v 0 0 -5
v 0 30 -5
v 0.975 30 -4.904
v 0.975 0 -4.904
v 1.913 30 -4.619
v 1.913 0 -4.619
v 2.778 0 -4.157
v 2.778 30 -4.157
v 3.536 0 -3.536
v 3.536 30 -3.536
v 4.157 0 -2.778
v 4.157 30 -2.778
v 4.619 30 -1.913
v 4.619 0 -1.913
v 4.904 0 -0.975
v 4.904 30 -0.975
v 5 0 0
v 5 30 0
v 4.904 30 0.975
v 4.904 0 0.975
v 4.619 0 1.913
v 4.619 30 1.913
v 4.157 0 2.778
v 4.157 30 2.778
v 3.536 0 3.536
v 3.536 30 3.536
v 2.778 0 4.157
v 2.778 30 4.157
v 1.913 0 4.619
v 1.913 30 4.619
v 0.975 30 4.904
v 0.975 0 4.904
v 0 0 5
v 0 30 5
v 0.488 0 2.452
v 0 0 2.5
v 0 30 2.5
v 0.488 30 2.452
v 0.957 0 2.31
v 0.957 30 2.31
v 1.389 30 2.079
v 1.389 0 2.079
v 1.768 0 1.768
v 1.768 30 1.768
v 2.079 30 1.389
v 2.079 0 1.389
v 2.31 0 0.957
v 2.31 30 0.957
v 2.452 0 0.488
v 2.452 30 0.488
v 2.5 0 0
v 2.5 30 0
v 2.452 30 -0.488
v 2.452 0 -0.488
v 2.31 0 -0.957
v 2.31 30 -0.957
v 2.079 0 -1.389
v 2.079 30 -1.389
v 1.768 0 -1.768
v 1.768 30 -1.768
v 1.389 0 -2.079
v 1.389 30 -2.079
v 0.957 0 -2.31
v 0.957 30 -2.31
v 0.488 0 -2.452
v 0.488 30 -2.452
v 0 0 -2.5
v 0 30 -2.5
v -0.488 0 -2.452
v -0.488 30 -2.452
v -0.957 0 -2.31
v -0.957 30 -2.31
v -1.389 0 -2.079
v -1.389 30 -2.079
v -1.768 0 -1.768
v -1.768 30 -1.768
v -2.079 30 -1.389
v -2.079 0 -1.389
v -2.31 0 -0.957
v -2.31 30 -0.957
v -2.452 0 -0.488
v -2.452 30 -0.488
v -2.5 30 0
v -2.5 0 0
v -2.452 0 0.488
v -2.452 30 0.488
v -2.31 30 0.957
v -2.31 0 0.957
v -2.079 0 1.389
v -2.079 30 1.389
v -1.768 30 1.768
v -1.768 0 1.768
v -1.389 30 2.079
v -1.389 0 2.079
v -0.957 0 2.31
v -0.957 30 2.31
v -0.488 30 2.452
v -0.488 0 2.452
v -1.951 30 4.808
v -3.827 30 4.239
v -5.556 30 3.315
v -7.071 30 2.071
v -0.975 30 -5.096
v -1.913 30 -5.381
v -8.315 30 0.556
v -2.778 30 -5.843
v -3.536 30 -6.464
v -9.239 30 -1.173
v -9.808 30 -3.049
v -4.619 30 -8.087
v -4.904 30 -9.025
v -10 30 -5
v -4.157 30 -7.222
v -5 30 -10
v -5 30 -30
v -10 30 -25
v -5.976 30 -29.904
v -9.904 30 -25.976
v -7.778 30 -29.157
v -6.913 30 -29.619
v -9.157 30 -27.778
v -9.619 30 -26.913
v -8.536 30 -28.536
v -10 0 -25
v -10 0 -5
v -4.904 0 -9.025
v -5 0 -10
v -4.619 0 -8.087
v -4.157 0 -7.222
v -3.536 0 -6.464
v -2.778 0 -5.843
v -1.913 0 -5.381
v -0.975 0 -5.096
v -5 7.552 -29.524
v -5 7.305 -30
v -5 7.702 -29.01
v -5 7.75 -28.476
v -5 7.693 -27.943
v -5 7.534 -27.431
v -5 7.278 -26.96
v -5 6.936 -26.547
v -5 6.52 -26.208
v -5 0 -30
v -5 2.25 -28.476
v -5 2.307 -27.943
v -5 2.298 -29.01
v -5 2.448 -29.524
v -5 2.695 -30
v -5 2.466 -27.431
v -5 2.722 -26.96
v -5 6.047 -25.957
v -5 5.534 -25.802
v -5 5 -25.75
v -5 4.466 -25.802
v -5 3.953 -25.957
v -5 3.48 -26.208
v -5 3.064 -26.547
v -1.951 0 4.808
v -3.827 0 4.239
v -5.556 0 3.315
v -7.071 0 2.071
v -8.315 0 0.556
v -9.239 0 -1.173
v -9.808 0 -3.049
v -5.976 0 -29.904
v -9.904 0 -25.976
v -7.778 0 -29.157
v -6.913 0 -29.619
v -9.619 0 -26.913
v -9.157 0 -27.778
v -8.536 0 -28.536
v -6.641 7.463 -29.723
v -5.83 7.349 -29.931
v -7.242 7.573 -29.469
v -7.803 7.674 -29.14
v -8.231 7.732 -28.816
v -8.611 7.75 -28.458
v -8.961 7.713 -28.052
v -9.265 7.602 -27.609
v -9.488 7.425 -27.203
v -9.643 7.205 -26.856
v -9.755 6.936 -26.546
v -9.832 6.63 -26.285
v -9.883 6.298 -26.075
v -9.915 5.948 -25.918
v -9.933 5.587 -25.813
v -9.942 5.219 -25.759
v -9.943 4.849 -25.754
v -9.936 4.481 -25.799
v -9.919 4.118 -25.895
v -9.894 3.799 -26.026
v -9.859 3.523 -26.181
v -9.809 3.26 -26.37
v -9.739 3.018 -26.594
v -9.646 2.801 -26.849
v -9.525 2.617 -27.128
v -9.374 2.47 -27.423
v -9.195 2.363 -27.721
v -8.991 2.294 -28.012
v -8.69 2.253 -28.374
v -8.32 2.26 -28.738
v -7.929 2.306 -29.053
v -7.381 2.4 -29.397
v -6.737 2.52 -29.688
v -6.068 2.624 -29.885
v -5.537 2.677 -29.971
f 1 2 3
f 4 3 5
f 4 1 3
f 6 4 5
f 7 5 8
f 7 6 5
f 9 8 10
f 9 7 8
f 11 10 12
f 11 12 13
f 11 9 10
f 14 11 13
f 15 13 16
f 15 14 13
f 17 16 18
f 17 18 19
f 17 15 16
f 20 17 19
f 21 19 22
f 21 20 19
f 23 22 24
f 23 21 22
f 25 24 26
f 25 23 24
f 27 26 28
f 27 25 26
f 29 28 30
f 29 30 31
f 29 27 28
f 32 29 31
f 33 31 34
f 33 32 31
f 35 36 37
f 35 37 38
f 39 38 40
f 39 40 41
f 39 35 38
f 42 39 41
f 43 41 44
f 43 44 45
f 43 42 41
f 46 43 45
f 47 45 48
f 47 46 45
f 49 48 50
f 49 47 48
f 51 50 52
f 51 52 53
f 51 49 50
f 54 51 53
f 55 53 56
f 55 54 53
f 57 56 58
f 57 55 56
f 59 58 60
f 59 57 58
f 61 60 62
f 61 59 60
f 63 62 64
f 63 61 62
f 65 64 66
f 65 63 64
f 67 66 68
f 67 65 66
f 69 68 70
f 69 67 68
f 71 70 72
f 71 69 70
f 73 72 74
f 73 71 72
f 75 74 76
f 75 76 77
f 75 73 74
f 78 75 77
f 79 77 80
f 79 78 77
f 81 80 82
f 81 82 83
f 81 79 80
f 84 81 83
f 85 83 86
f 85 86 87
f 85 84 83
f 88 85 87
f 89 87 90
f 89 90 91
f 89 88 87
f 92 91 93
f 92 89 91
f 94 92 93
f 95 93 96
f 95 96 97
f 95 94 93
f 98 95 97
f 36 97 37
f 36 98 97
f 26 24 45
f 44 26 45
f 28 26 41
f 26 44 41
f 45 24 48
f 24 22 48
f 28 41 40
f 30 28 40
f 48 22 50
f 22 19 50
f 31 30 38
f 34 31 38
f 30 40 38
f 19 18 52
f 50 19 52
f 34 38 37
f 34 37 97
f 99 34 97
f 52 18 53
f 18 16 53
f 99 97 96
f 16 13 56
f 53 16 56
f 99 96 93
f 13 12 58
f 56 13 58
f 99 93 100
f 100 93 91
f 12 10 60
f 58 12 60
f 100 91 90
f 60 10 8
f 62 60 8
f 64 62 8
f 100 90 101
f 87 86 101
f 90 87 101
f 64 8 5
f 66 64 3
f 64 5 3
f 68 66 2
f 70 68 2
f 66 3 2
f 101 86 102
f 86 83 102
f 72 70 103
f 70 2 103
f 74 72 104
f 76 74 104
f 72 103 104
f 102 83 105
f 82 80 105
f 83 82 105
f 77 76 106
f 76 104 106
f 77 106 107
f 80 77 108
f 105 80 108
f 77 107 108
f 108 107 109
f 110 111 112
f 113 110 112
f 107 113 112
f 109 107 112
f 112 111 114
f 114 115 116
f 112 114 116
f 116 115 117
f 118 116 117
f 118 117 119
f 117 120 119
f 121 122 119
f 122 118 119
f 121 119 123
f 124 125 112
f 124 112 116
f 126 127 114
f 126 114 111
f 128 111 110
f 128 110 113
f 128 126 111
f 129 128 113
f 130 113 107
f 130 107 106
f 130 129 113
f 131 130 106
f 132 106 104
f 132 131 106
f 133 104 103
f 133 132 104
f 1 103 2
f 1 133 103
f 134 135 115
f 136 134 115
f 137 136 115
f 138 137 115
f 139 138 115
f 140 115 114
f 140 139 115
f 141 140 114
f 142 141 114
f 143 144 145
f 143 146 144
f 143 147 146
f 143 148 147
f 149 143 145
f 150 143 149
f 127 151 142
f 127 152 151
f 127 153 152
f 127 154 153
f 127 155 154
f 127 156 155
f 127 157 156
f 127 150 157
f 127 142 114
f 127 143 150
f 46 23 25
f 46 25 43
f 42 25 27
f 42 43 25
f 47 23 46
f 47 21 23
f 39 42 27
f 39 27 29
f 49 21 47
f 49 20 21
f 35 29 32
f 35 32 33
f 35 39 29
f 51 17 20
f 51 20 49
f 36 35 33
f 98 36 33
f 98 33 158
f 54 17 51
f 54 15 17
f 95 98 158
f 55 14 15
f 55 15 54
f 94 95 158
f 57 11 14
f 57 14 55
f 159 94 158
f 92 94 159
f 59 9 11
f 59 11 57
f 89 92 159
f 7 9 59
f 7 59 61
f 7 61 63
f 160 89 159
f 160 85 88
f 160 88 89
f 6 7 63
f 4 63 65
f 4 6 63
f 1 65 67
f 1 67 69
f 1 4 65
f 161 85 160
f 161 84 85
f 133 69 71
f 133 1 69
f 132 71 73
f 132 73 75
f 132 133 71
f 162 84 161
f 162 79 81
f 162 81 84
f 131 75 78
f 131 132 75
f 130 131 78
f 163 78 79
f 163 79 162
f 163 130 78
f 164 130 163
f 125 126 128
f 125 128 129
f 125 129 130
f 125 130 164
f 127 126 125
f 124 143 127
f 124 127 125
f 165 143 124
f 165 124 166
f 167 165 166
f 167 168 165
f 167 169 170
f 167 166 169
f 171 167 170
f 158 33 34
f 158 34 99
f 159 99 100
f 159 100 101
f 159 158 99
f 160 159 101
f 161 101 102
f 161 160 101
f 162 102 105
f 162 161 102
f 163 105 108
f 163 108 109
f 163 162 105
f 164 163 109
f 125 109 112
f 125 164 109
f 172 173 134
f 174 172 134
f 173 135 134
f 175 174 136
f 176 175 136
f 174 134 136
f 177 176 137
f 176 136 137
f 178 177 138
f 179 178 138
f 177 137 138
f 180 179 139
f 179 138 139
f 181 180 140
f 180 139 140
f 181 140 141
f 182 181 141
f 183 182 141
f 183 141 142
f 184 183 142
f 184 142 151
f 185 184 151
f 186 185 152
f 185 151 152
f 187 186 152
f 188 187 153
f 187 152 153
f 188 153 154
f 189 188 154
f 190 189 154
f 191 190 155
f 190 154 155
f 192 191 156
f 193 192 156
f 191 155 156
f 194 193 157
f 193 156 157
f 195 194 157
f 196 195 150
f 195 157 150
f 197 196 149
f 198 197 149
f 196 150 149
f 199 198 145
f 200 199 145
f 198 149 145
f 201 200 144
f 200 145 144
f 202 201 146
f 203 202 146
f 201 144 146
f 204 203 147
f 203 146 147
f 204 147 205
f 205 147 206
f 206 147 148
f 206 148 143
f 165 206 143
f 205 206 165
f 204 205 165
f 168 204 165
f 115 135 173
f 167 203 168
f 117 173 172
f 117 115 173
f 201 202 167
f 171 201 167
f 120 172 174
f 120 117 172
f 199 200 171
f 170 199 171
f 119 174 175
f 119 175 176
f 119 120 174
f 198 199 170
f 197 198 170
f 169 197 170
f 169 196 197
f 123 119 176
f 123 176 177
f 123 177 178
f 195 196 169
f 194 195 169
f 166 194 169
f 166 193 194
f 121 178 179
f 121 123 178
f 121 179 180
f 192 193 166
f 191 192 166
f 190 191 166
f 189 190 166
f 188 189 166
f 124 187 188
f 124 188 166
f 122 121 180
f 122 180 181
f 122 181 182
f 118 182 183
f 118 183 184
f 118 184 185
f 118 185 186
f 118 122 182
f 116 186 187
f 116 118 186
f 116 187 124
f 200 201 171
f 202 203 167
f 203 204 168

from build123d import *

# Parameters (mm, degrees)
SKETCH1_R           = 2.5
BOSS_EXTRUDE1_DEPTH = 30
FILLET1_R           = 5
SKETCH2_R           = 2.75
CUT_EXTRUDE1_DEPTH  = 124


with BuildPart() as part:
    # Sketch1 → Boss-Extrude1 (new body)
    with BuildSketch(Plane(origin=(0, 0, 0), x_dir=(1, 0, 0), z_dir=(0, 1, 0))):
        with BuildLine():
            Line((-5, 30), (-5, 10))
            ThreePointArc((-5, 10), (-3.535533906, 6.464466094), (0, 5))
            ThreePointArc((0, 5), (5, 0), (0, -5))
            ThreePointArc((0, -5), (-7.071067812, -2.071067812), (-10, 5))
            Line((-10, 5), (-10, 30))
            Line((-10, 30), (-5, 30))
        make_face()
        with Locations(Location((0, 0, 0), (0, 0, 270))):
            Circle(SKETCH1_R, mode=Mode.SUBTRACT)
    extrude(amount=BOSS_EXTRUDE1_DEPTH)

    # Fillet1
    fillet1_edges = [part.edges().sort_by_distance(p)[0] for p in [
        (-10, 15, -30),
    ]]
    fillet(fillet1_edges, radius=FILLET1_R - 0.0001)  # a hair under: the kernel refuses the full size

    # Sketch2 → Cut-Extrude1 (cut)
    with BuildSketch(Plane(origin=(5, -405, -405), x_dir=(0, 0, -1), z_dir=(1, 0, 0))):
        with Locations((-376.5, 410)):
            Circle(SKETCH2_R)
    extrude(amount=-CUT_EXTRUDE1_DEPTH, mode=Mode.SUBTRACT)


solid = part.part
